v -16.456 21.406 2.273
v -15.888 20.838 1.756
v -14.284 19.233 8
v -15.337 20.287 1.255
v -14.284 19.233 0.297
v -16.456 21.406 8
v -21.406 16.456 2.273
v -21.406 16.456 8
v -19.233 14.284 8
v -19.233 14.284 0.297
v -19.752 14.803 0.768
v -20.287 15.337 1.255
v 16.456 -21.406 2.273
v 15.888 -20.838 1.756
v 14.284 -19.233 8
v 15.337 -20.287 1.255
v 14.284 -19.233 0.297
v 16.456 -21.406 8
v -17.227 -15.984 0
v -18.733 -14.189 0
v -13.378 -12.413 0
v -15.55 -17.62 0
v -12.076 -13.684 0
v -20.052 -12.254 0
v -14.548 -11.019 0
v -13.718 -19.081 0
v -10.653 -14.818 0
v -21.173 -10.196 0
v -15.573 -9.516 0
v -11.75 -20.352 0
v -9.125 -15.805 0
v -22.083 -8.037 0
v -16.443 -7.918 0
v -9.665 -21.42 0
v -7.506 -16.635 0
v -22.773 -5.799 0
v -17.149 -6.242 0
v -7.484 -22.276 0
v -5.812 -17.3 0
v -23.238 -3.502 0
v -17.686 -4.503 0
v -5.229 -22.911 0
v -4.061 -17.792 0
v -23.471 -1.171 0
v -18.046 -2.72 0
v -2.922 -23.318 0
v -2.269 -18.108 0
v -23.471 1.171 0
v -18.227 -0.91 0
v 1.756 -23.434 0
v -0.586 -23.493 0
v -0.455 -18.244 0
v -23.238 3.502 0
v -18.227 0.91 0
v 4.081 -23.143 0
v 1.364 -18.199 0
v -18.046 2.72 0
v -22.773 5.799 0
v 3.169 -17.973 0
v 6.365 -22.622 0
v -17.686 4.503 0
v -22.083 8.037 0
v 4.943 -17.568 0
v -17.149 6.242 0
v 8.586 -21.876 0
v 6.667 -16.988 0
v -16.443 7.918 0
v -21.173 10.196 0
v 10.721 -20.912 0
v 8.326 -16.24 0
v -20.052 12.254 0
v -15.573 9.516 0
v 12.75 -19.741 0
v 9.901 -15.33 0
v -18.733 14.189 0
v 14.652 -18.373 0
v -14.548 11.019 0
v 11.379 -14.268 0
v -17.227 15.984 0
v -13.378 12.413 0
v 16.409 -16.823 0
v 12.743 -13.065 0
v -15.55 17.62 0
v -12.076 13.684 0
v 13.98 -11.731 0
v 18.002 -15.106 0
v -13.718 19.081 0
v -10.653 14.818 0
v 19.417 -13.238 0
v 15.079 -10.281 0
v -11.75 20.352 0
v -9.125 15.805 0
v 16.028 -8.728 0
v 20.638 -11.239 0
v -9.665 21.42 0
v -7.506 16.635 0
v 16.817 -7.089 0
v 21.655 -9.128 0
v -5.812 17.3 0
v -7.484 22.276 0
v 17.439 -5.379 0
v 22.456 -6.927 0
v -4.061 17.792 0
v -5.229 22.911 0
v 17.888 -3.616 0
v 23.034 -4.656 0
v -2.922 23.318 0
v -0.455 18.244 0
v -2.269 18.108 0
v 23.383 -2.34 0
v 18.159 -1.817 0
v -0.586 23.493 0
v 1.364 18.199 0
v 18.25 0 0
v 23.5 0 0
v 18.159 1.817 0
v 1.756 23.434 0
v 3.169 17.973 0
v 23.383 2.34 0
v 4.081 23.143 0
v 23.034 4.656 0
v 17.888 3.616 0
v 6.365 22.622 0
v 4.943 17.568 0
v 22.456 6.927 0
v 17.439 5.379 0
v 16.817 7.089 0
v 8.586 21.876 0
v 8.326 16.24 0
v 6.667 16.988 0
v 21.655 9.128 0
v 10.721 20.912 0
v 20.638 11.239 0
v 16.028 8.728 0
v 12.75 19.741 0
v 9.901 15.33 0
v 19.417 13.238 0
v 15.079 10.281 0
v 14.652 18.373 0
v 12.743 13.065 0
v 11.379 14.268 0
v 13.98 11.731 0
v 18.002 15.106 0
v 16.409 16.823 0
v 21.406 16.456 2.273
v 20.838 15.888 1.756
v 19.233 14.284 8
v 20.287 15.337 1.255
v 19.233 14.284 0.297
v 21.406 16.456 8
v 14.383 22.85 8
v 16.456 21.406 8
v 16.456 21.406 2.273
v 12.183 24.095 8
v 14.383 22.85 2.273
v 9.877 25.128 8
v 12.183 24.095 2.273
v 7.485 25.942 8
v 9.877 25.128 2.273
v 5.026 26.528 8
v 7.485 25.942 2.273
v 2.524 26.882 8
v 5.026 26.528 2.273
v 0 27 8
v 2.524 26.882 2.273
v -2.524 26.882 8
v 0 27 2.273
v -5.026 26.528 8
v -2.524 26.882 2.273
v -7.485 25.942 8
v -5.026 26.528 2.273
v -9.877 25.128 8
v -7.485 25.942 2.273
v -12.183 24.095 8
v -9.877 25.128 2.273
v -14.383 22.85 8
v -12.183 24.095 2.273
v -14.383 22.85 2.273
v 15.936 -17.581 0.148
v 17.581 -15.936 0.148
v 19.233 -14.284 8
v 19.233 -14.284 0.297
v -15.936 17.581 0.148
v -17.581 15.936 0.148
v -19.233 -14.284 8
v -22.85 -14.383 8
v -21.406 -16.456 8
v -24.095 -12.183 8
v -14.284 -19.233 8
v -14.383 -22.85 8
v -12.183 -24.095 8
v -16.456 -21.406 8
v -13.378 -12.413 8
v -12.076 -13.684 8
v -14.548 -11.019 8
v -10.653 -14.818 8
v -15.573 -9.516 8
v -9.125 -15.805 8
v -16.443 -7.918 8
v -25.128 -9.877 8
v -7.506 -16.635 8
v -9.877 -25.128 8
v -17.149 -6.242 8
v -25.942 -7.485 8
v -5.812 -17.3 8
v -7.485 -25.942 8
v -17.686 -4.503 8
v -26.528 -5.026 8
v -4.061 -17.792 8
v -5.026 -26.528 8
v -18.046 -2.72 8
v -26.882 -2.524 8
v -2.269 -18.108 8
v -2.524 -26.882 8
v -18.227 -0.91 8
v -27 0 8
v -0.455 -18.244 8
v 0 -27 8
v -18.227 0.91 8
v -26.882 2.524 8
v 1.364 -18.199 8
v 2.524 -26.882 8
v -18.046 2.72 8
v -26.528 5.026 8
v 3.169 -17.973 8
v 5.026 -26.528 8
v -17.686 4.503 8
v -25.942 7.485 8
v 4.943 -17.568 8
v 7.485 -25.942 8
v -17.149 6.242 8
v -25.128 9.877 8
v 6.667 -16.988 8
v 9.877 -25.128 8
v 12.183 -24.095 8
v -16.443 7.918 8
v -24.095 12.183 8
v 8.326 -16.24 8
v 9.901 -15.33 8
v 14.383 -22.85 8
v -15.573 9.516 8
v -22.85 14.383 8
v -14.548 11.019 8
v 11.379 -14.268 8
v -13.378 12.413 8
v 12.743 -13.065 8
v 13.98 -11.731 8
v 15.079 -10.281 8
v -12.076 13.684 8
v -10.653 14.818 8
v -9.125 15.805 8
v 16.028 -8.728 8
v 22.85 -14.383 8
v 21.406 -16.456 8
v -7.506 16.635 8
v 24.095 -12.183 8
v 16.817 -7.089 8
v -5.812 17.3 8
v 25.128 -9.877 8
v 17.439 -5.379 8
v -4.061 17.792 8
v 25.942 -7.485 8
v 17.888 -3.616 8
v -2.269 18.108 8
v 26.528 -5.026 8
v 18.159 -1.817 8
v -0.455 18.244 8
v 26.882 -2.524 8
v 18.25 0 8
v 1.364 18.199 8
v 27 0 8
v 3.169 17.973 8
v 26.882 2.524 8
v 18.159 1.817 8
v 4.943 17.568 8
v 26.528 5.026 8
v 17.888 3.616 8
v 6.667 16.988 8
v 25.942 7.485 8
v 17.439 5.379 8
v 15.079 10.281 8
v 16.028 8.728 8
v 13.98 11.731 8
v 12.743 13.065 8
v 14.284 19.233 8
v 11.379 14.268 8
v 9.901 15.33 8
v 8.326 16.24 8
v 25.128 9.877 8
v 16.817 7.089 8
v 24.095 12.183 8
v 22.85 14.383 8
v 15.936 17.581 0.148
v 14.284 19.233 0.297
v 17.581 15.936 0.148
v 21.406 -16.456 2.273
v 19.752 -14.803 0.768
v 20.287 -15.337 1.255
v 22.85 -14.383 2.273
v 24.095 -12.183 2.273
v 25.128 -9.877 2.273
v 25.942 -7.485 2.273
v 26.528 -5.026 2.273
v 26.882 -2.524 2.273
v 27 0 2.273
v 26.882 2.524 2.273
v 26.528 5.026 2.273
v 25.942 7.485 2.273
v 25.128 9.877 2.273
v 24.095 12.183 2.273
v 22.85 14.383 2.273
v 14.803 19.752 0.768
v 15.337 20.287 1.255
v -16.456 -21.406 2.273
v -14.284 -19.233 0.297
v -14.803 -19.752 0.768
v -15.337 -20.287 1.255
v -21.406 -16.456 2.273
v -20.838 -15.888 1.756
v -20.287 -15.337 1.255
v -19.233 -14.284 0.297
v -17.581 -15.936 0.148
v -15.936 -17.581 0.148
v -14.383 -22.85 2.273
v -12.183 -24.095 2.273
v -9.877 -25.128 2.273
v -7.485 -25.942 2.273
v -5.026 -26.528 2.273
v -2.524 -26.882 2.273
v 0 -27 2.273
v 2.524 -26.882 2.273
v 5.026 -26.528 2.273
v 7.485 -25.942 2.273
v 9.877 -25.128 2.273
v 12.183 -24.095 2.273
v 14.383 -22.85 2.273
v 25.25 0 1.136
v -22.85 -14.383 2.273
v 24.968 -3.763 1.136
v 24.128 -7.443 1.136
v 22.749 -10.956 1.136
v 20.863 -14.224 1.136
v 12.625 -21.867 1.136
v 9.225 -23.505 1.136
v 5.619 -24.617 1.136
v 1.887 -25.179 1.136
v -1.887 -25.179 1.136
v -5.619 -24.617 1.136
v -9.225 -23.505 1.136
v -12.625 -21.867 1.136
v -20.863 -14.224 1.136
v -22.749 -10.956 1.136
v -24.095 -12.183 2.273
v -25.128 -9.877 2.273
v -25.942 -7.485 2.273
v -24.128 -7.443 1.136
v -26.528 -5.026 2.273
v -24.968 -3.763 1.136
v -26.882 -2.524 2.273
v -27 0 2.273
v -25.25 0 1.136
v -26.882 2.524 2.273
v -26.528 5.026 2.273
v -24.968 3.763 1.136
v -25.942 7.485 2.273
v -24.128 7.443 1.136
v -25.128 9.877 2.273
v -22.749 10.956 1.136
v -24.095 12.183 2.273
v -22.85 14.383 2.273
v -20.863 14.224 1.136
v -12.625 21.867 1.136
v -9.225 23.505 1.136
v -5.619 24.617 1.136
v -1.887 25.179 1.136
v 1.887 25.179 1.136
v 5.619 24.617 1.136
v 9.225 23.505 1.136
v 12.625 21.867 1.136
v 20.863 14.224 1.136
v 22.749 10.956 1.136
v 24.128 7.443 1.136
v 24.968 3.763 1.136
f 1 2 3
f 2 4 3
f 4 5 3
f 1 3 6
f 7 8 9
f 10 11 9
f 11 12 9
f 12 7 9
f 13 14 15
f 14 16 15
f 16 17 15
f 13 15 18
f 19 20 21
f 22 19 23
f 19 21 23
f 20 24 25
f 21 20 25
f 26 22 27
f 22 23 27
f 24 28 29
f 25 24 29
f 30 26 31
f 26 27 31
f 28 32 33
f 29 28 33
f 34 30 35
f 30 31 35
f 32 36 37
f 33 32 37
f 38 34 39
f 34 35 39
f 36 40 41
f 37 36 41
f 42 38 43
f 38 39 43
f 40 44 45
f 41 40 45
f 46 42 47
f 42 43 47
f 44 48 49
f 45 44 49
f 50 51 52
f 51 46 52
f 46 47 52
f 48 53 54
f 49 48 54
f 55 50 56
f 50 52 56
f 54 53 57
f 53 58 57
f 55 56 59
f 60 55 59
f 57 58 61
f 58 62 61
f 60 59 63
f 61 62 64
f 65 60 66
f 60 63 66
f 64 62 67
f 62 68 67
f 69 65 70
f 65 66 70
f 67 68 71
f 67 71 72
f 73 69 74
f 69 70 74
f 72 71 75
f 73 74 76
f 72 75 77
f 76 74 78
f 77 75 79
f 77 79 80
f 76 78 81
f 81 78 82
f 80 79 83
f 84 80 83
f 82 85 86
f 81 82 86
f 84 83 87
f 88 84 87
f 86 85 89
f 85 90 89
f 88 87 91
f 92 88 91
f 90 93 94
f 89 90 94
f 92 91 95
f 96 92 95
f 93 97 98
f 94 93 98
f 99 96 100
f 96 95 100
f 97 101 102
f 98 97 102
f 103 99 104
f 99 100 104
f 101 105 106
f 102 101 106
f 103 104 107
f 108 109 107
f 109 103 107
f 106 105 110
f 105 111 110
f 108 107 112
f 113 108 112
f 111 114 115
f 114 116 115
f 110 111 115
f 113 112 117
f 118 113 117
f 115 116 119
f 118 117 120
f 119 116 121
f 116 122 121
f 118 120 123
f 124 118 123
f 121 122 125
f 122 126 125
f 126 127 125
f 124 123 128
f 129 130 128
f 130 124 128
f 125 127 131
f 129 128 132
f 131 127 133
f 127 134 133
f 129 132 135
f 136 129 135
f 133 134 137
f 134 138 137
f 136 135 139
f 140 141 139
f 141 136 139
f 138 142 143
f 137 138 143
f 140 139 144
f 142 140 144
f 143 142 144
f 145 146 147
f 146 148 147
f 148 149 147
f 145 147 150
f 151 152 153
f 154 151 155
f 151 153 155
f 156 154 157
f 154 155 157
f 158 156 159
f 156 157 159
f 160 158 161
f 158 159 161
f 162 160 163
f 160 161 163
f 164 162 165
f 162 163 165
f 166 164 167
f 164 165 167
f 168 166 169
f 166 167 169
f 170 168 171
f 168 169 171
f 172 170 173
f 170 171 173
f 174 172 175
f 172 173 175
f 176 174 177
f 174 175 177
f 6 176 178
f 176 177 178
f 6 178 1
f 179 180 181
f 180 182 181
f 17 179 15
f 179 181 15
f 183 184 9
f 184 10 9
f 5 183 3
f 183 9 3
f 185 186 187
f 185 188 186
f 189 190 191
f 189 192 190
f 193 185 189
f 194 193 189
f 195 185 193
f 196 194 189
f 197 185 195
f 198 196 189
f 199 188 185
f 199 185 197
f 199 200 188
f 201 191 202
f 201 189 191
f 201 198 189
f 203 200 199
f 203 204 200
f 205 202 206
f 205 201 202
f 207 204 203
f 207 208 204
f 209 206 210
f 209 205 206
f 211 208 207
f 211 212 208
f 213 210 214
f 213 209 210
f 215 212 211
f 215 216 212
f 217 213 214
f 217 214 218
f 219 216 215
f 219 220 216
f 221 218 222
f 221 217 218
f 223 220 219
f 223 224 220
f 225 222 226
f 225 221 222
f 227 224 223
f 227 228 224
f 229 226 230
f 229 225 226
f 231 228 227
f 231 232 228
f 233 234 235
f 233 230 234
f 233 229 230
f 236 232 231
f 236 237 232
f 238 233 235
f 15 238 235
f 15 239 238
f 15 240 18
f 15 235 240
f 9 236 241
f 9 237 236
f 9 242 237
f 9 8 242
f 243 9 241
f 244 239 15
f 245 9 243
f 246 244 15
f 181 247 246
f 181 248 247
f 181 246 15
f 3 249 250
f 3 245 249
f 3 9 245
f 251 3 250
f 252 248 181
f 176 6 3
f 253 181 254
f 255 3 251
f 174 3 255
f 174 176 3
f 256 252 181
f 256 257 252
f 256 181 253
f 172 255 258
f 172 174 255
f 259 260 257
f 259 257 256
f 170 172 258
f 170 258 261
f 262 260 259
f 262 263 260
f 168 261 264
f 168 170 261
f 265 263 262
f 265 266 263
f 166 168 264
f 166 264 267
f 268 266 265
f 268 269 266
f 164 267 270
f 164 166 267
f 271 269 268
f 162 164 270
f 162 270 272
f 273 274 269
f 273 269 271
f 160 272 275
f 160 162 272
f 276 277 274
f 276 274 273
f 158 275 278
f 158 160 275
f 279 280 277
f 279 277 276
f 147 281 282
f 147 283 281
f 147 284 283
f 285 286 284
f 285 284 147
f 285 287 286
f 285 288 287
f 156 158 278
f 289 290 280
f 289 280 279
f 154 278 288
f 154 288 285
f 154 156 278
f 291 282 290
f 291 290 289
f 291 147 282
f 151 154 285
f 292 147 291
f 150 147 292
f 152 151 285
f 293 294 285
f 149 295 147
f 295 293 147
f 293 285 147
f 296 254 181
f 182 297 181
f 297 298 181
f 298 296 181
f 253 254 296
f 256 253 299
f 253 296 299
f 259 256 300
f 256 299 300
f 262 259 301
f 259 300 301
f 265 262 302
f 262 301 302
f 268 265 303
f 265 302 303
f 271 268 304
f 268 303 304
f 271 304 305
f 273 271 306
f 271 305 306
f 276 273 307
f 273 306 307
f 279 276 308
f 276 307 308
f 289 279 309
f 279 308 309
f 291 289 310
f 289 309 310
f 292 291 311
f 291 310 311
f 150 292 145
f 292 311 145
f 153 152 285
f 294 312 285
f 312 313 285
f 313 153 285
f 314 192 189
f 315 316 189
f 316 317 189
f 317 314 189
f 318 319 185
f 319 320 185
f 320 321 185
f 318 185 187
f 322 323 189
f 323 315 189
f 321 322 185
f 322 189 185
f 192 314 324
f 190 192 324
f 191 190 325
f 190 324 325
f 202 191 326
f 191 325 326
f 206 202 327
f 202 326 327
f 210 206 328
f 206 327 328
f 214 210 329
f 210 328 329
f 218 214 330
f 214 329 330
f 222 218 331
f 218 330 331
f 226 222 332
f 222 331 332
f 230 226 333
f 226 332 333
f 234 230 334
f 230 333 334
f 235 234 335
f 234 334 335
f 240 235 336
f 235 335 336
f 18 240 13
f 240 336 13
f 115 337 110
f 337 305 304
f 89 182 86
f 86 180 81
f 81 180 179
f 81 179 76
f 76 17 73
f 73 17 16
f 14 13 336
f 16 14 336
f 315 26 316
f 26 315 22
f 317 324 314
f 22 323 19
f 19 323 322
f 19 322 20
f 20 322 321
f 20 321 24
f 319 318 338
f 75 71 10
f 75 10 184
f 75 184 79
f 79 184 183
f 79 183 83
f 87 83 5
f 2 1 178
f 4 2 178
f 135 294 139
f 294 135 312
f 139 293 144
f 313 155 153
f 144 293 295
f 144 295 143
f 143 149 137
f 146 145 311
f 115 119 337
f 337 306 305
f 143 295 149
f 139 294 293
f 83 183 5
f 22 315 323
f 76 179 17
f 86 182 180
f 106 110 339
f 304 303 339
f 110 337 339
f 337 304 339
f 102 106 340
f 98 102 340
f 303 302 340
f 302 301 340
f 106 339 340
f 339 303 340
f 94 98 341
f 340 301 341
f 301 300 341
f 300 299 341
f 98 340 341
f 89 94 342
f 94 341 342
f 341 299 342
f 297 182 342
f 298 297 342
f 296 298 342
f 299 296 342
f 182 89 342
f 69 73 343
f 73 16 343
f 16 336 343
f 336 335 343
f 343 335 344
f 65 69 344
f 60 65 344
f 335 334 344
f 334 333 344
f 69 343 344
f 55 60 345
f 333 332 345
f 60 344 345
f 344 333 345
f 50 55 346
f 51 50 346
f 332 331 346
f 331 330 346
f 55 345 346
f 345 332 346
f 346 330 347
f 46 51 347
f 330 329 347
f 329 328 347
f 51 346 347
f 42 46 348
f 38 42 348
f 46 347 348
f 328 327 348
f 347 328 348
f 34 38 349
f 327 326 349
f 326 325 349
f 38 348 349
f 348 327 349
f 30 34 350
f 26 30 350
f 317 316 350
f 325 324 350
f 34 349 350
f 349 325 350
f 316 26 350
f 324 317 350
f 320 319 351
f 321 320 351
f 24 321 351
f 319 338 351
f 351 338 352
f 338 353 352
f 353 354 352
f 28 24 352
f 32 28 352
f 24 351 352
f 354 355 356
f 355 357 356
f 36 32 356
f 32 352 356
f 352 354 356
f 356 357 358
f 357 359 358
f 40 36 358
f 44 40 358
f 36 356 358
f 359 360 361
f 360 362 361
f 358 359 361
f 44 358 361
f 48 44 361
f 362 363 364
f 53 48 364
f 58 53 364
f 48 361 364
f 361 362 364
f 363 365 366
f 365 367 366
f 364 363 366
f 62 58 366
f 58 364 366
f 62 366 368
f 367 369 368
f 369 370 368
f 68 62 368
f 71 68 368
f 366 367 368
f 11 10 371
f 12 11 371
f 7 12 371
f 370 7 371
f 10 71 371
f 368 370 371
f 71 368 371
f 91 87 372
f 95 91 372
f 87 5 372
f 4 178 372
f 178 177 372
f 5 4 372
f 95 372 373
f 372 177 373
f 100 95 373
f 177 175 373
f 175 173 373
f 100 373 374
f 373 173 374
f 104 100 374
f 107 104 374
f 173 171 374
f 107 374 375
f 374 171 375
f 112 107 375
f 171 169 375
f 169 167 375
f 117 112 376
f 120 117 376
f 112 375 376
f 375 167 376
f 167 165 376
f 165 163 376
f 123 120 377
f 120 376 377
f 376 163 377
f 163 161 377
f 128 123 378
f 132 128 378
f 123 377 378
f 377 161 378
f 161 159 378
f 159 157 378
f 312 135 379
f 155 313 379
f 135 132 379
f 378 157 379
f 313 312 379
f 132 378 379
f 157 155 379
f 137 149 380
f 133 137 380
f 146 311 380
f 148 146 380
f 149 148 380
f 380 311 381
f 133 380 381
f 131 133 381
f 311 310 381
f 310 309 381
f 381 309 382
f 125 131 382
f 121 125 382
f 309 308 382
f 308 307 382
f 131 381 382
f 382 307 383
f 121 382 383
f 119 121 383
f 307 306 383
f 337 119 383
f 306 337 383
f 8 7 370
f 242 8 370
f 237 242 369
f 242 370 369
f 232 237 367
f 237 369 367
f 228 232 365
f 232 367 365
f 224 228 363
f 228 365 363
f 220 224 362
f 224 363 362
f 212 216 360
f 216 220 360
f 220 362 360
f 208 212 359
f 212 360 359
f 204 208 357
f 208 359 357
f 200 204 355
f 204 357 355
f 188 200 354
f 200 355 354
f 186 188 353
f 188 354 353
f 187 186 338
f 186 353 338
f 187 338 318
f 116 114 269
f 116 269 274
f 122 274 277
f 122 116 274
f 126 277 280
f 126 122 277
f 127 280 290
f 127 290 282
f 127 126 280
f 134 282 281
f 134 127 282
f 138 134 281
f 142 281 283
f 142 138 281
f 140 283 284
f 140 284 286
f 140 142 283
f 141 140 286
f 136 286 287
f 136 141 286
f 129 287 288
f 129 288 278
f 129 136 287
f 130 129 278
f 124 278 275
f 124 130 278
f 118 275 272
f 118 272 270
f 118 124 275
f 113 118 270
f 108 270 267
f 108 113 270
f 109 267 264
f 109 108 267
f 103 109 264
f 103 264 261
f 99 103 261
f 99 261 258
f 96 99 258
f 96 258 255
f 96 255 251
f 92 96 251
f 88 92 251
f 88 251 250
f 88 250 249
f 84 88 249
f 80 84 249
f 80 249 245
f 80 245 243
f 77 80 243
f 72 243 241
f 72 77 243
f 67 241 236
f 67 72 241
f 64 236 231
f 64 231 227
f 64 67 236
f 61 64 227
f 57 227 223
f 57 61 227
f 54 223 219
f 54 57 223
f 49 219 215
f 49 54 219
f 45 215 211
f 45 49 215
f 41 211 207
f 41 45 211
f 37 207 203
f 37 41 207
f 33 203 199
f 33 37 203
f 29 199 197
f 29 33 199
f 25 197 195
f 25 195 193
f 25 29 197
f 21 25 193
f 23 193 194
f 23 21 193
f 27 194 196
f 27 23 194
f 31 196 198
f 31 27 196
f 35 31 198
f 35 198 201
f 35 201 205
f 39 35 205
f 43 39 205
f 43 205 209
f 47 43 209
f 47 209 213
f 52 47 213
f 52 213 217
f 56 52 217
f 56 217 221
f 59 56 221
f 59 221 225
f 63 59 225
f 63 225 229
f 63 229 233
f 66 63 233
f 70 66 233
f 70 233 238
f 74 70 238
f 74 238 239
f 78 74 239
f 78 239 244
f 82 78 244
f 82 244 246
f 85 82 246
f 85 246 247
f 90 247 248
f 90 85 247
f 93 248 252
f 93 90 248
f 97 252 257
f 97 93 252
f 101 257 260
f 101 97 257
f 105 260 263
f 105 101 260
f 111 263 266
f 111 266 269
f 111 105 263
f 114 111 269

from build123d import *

# Parameters (mm, degrees)
SKETCH1_R          = 27
SKETCH1_R_2        = 18.25
EXTRUDE1_DEPTH     = 8
CUT_EXTRUDE1_DEPTH = 9
CIRPATTERN1_COUNT  = 4


with BuildPart() as part:
    # Sketch1 → Extrude1 (new body)
    with BuildSketch(Plane.XY):
        Circle(SKETCH1_R)
        Circle(SKETCH1_R_2, mode=Mode.SUBTRACT)
    extrude(amount=EXTRUDE1_DEPTH)

    # Sketch2 → Cut-Extrude1 (cut, through all)
    with BuildSketch(Plane.XY.offset(8)):
        with BuildLine():
            Line((16.455921283, 21.405668752), (14.28355698, 19.233304448))
            Line((14.28355698, 19.233304448), (19.233304448, 14.28355698))
            Line((19.233304448, 14.28355698), (21.405668752, 16.455921283))
            ThreePointArc((21.405668752, 16.455921283), (19.091883092, 19.091883092), (16.455921283, 21.405668752))
        make_face()
    cut_extrude1 = extrude(amount=-CUT_EXTRUDE1_DEPTH, mode=Mode.SUBTRACT)

    # CirPattern1: Cut-Extrude1 ×4 about axis
    cirpattern1_axis = Axis((0, 0, 0), (0, 0, 1))
    for i in range(1, CIRPATTERN1_COUNT):
        add(cut_extrude1.rotate(cirpattern1_axis, i * 360 / CIRPATTERN1_COUNT), mode=Mode.SUBTRACT)

    # Sketch3 → Cut-Revolve1 (revolve, cut)
    with BuildSketch(Plane(origin=(0, 0, 0), x_dir=(1, 0, 0), z_dir=(0, 1, 0))):
        Polygon((27, 0), (23.5, 0), (27, -2.272926576), align=None)
    revolve(axis=Axis((0, 0, 0), (0, 0, -1)), mode=Mode.SUBTRACT)


solid = part.part
